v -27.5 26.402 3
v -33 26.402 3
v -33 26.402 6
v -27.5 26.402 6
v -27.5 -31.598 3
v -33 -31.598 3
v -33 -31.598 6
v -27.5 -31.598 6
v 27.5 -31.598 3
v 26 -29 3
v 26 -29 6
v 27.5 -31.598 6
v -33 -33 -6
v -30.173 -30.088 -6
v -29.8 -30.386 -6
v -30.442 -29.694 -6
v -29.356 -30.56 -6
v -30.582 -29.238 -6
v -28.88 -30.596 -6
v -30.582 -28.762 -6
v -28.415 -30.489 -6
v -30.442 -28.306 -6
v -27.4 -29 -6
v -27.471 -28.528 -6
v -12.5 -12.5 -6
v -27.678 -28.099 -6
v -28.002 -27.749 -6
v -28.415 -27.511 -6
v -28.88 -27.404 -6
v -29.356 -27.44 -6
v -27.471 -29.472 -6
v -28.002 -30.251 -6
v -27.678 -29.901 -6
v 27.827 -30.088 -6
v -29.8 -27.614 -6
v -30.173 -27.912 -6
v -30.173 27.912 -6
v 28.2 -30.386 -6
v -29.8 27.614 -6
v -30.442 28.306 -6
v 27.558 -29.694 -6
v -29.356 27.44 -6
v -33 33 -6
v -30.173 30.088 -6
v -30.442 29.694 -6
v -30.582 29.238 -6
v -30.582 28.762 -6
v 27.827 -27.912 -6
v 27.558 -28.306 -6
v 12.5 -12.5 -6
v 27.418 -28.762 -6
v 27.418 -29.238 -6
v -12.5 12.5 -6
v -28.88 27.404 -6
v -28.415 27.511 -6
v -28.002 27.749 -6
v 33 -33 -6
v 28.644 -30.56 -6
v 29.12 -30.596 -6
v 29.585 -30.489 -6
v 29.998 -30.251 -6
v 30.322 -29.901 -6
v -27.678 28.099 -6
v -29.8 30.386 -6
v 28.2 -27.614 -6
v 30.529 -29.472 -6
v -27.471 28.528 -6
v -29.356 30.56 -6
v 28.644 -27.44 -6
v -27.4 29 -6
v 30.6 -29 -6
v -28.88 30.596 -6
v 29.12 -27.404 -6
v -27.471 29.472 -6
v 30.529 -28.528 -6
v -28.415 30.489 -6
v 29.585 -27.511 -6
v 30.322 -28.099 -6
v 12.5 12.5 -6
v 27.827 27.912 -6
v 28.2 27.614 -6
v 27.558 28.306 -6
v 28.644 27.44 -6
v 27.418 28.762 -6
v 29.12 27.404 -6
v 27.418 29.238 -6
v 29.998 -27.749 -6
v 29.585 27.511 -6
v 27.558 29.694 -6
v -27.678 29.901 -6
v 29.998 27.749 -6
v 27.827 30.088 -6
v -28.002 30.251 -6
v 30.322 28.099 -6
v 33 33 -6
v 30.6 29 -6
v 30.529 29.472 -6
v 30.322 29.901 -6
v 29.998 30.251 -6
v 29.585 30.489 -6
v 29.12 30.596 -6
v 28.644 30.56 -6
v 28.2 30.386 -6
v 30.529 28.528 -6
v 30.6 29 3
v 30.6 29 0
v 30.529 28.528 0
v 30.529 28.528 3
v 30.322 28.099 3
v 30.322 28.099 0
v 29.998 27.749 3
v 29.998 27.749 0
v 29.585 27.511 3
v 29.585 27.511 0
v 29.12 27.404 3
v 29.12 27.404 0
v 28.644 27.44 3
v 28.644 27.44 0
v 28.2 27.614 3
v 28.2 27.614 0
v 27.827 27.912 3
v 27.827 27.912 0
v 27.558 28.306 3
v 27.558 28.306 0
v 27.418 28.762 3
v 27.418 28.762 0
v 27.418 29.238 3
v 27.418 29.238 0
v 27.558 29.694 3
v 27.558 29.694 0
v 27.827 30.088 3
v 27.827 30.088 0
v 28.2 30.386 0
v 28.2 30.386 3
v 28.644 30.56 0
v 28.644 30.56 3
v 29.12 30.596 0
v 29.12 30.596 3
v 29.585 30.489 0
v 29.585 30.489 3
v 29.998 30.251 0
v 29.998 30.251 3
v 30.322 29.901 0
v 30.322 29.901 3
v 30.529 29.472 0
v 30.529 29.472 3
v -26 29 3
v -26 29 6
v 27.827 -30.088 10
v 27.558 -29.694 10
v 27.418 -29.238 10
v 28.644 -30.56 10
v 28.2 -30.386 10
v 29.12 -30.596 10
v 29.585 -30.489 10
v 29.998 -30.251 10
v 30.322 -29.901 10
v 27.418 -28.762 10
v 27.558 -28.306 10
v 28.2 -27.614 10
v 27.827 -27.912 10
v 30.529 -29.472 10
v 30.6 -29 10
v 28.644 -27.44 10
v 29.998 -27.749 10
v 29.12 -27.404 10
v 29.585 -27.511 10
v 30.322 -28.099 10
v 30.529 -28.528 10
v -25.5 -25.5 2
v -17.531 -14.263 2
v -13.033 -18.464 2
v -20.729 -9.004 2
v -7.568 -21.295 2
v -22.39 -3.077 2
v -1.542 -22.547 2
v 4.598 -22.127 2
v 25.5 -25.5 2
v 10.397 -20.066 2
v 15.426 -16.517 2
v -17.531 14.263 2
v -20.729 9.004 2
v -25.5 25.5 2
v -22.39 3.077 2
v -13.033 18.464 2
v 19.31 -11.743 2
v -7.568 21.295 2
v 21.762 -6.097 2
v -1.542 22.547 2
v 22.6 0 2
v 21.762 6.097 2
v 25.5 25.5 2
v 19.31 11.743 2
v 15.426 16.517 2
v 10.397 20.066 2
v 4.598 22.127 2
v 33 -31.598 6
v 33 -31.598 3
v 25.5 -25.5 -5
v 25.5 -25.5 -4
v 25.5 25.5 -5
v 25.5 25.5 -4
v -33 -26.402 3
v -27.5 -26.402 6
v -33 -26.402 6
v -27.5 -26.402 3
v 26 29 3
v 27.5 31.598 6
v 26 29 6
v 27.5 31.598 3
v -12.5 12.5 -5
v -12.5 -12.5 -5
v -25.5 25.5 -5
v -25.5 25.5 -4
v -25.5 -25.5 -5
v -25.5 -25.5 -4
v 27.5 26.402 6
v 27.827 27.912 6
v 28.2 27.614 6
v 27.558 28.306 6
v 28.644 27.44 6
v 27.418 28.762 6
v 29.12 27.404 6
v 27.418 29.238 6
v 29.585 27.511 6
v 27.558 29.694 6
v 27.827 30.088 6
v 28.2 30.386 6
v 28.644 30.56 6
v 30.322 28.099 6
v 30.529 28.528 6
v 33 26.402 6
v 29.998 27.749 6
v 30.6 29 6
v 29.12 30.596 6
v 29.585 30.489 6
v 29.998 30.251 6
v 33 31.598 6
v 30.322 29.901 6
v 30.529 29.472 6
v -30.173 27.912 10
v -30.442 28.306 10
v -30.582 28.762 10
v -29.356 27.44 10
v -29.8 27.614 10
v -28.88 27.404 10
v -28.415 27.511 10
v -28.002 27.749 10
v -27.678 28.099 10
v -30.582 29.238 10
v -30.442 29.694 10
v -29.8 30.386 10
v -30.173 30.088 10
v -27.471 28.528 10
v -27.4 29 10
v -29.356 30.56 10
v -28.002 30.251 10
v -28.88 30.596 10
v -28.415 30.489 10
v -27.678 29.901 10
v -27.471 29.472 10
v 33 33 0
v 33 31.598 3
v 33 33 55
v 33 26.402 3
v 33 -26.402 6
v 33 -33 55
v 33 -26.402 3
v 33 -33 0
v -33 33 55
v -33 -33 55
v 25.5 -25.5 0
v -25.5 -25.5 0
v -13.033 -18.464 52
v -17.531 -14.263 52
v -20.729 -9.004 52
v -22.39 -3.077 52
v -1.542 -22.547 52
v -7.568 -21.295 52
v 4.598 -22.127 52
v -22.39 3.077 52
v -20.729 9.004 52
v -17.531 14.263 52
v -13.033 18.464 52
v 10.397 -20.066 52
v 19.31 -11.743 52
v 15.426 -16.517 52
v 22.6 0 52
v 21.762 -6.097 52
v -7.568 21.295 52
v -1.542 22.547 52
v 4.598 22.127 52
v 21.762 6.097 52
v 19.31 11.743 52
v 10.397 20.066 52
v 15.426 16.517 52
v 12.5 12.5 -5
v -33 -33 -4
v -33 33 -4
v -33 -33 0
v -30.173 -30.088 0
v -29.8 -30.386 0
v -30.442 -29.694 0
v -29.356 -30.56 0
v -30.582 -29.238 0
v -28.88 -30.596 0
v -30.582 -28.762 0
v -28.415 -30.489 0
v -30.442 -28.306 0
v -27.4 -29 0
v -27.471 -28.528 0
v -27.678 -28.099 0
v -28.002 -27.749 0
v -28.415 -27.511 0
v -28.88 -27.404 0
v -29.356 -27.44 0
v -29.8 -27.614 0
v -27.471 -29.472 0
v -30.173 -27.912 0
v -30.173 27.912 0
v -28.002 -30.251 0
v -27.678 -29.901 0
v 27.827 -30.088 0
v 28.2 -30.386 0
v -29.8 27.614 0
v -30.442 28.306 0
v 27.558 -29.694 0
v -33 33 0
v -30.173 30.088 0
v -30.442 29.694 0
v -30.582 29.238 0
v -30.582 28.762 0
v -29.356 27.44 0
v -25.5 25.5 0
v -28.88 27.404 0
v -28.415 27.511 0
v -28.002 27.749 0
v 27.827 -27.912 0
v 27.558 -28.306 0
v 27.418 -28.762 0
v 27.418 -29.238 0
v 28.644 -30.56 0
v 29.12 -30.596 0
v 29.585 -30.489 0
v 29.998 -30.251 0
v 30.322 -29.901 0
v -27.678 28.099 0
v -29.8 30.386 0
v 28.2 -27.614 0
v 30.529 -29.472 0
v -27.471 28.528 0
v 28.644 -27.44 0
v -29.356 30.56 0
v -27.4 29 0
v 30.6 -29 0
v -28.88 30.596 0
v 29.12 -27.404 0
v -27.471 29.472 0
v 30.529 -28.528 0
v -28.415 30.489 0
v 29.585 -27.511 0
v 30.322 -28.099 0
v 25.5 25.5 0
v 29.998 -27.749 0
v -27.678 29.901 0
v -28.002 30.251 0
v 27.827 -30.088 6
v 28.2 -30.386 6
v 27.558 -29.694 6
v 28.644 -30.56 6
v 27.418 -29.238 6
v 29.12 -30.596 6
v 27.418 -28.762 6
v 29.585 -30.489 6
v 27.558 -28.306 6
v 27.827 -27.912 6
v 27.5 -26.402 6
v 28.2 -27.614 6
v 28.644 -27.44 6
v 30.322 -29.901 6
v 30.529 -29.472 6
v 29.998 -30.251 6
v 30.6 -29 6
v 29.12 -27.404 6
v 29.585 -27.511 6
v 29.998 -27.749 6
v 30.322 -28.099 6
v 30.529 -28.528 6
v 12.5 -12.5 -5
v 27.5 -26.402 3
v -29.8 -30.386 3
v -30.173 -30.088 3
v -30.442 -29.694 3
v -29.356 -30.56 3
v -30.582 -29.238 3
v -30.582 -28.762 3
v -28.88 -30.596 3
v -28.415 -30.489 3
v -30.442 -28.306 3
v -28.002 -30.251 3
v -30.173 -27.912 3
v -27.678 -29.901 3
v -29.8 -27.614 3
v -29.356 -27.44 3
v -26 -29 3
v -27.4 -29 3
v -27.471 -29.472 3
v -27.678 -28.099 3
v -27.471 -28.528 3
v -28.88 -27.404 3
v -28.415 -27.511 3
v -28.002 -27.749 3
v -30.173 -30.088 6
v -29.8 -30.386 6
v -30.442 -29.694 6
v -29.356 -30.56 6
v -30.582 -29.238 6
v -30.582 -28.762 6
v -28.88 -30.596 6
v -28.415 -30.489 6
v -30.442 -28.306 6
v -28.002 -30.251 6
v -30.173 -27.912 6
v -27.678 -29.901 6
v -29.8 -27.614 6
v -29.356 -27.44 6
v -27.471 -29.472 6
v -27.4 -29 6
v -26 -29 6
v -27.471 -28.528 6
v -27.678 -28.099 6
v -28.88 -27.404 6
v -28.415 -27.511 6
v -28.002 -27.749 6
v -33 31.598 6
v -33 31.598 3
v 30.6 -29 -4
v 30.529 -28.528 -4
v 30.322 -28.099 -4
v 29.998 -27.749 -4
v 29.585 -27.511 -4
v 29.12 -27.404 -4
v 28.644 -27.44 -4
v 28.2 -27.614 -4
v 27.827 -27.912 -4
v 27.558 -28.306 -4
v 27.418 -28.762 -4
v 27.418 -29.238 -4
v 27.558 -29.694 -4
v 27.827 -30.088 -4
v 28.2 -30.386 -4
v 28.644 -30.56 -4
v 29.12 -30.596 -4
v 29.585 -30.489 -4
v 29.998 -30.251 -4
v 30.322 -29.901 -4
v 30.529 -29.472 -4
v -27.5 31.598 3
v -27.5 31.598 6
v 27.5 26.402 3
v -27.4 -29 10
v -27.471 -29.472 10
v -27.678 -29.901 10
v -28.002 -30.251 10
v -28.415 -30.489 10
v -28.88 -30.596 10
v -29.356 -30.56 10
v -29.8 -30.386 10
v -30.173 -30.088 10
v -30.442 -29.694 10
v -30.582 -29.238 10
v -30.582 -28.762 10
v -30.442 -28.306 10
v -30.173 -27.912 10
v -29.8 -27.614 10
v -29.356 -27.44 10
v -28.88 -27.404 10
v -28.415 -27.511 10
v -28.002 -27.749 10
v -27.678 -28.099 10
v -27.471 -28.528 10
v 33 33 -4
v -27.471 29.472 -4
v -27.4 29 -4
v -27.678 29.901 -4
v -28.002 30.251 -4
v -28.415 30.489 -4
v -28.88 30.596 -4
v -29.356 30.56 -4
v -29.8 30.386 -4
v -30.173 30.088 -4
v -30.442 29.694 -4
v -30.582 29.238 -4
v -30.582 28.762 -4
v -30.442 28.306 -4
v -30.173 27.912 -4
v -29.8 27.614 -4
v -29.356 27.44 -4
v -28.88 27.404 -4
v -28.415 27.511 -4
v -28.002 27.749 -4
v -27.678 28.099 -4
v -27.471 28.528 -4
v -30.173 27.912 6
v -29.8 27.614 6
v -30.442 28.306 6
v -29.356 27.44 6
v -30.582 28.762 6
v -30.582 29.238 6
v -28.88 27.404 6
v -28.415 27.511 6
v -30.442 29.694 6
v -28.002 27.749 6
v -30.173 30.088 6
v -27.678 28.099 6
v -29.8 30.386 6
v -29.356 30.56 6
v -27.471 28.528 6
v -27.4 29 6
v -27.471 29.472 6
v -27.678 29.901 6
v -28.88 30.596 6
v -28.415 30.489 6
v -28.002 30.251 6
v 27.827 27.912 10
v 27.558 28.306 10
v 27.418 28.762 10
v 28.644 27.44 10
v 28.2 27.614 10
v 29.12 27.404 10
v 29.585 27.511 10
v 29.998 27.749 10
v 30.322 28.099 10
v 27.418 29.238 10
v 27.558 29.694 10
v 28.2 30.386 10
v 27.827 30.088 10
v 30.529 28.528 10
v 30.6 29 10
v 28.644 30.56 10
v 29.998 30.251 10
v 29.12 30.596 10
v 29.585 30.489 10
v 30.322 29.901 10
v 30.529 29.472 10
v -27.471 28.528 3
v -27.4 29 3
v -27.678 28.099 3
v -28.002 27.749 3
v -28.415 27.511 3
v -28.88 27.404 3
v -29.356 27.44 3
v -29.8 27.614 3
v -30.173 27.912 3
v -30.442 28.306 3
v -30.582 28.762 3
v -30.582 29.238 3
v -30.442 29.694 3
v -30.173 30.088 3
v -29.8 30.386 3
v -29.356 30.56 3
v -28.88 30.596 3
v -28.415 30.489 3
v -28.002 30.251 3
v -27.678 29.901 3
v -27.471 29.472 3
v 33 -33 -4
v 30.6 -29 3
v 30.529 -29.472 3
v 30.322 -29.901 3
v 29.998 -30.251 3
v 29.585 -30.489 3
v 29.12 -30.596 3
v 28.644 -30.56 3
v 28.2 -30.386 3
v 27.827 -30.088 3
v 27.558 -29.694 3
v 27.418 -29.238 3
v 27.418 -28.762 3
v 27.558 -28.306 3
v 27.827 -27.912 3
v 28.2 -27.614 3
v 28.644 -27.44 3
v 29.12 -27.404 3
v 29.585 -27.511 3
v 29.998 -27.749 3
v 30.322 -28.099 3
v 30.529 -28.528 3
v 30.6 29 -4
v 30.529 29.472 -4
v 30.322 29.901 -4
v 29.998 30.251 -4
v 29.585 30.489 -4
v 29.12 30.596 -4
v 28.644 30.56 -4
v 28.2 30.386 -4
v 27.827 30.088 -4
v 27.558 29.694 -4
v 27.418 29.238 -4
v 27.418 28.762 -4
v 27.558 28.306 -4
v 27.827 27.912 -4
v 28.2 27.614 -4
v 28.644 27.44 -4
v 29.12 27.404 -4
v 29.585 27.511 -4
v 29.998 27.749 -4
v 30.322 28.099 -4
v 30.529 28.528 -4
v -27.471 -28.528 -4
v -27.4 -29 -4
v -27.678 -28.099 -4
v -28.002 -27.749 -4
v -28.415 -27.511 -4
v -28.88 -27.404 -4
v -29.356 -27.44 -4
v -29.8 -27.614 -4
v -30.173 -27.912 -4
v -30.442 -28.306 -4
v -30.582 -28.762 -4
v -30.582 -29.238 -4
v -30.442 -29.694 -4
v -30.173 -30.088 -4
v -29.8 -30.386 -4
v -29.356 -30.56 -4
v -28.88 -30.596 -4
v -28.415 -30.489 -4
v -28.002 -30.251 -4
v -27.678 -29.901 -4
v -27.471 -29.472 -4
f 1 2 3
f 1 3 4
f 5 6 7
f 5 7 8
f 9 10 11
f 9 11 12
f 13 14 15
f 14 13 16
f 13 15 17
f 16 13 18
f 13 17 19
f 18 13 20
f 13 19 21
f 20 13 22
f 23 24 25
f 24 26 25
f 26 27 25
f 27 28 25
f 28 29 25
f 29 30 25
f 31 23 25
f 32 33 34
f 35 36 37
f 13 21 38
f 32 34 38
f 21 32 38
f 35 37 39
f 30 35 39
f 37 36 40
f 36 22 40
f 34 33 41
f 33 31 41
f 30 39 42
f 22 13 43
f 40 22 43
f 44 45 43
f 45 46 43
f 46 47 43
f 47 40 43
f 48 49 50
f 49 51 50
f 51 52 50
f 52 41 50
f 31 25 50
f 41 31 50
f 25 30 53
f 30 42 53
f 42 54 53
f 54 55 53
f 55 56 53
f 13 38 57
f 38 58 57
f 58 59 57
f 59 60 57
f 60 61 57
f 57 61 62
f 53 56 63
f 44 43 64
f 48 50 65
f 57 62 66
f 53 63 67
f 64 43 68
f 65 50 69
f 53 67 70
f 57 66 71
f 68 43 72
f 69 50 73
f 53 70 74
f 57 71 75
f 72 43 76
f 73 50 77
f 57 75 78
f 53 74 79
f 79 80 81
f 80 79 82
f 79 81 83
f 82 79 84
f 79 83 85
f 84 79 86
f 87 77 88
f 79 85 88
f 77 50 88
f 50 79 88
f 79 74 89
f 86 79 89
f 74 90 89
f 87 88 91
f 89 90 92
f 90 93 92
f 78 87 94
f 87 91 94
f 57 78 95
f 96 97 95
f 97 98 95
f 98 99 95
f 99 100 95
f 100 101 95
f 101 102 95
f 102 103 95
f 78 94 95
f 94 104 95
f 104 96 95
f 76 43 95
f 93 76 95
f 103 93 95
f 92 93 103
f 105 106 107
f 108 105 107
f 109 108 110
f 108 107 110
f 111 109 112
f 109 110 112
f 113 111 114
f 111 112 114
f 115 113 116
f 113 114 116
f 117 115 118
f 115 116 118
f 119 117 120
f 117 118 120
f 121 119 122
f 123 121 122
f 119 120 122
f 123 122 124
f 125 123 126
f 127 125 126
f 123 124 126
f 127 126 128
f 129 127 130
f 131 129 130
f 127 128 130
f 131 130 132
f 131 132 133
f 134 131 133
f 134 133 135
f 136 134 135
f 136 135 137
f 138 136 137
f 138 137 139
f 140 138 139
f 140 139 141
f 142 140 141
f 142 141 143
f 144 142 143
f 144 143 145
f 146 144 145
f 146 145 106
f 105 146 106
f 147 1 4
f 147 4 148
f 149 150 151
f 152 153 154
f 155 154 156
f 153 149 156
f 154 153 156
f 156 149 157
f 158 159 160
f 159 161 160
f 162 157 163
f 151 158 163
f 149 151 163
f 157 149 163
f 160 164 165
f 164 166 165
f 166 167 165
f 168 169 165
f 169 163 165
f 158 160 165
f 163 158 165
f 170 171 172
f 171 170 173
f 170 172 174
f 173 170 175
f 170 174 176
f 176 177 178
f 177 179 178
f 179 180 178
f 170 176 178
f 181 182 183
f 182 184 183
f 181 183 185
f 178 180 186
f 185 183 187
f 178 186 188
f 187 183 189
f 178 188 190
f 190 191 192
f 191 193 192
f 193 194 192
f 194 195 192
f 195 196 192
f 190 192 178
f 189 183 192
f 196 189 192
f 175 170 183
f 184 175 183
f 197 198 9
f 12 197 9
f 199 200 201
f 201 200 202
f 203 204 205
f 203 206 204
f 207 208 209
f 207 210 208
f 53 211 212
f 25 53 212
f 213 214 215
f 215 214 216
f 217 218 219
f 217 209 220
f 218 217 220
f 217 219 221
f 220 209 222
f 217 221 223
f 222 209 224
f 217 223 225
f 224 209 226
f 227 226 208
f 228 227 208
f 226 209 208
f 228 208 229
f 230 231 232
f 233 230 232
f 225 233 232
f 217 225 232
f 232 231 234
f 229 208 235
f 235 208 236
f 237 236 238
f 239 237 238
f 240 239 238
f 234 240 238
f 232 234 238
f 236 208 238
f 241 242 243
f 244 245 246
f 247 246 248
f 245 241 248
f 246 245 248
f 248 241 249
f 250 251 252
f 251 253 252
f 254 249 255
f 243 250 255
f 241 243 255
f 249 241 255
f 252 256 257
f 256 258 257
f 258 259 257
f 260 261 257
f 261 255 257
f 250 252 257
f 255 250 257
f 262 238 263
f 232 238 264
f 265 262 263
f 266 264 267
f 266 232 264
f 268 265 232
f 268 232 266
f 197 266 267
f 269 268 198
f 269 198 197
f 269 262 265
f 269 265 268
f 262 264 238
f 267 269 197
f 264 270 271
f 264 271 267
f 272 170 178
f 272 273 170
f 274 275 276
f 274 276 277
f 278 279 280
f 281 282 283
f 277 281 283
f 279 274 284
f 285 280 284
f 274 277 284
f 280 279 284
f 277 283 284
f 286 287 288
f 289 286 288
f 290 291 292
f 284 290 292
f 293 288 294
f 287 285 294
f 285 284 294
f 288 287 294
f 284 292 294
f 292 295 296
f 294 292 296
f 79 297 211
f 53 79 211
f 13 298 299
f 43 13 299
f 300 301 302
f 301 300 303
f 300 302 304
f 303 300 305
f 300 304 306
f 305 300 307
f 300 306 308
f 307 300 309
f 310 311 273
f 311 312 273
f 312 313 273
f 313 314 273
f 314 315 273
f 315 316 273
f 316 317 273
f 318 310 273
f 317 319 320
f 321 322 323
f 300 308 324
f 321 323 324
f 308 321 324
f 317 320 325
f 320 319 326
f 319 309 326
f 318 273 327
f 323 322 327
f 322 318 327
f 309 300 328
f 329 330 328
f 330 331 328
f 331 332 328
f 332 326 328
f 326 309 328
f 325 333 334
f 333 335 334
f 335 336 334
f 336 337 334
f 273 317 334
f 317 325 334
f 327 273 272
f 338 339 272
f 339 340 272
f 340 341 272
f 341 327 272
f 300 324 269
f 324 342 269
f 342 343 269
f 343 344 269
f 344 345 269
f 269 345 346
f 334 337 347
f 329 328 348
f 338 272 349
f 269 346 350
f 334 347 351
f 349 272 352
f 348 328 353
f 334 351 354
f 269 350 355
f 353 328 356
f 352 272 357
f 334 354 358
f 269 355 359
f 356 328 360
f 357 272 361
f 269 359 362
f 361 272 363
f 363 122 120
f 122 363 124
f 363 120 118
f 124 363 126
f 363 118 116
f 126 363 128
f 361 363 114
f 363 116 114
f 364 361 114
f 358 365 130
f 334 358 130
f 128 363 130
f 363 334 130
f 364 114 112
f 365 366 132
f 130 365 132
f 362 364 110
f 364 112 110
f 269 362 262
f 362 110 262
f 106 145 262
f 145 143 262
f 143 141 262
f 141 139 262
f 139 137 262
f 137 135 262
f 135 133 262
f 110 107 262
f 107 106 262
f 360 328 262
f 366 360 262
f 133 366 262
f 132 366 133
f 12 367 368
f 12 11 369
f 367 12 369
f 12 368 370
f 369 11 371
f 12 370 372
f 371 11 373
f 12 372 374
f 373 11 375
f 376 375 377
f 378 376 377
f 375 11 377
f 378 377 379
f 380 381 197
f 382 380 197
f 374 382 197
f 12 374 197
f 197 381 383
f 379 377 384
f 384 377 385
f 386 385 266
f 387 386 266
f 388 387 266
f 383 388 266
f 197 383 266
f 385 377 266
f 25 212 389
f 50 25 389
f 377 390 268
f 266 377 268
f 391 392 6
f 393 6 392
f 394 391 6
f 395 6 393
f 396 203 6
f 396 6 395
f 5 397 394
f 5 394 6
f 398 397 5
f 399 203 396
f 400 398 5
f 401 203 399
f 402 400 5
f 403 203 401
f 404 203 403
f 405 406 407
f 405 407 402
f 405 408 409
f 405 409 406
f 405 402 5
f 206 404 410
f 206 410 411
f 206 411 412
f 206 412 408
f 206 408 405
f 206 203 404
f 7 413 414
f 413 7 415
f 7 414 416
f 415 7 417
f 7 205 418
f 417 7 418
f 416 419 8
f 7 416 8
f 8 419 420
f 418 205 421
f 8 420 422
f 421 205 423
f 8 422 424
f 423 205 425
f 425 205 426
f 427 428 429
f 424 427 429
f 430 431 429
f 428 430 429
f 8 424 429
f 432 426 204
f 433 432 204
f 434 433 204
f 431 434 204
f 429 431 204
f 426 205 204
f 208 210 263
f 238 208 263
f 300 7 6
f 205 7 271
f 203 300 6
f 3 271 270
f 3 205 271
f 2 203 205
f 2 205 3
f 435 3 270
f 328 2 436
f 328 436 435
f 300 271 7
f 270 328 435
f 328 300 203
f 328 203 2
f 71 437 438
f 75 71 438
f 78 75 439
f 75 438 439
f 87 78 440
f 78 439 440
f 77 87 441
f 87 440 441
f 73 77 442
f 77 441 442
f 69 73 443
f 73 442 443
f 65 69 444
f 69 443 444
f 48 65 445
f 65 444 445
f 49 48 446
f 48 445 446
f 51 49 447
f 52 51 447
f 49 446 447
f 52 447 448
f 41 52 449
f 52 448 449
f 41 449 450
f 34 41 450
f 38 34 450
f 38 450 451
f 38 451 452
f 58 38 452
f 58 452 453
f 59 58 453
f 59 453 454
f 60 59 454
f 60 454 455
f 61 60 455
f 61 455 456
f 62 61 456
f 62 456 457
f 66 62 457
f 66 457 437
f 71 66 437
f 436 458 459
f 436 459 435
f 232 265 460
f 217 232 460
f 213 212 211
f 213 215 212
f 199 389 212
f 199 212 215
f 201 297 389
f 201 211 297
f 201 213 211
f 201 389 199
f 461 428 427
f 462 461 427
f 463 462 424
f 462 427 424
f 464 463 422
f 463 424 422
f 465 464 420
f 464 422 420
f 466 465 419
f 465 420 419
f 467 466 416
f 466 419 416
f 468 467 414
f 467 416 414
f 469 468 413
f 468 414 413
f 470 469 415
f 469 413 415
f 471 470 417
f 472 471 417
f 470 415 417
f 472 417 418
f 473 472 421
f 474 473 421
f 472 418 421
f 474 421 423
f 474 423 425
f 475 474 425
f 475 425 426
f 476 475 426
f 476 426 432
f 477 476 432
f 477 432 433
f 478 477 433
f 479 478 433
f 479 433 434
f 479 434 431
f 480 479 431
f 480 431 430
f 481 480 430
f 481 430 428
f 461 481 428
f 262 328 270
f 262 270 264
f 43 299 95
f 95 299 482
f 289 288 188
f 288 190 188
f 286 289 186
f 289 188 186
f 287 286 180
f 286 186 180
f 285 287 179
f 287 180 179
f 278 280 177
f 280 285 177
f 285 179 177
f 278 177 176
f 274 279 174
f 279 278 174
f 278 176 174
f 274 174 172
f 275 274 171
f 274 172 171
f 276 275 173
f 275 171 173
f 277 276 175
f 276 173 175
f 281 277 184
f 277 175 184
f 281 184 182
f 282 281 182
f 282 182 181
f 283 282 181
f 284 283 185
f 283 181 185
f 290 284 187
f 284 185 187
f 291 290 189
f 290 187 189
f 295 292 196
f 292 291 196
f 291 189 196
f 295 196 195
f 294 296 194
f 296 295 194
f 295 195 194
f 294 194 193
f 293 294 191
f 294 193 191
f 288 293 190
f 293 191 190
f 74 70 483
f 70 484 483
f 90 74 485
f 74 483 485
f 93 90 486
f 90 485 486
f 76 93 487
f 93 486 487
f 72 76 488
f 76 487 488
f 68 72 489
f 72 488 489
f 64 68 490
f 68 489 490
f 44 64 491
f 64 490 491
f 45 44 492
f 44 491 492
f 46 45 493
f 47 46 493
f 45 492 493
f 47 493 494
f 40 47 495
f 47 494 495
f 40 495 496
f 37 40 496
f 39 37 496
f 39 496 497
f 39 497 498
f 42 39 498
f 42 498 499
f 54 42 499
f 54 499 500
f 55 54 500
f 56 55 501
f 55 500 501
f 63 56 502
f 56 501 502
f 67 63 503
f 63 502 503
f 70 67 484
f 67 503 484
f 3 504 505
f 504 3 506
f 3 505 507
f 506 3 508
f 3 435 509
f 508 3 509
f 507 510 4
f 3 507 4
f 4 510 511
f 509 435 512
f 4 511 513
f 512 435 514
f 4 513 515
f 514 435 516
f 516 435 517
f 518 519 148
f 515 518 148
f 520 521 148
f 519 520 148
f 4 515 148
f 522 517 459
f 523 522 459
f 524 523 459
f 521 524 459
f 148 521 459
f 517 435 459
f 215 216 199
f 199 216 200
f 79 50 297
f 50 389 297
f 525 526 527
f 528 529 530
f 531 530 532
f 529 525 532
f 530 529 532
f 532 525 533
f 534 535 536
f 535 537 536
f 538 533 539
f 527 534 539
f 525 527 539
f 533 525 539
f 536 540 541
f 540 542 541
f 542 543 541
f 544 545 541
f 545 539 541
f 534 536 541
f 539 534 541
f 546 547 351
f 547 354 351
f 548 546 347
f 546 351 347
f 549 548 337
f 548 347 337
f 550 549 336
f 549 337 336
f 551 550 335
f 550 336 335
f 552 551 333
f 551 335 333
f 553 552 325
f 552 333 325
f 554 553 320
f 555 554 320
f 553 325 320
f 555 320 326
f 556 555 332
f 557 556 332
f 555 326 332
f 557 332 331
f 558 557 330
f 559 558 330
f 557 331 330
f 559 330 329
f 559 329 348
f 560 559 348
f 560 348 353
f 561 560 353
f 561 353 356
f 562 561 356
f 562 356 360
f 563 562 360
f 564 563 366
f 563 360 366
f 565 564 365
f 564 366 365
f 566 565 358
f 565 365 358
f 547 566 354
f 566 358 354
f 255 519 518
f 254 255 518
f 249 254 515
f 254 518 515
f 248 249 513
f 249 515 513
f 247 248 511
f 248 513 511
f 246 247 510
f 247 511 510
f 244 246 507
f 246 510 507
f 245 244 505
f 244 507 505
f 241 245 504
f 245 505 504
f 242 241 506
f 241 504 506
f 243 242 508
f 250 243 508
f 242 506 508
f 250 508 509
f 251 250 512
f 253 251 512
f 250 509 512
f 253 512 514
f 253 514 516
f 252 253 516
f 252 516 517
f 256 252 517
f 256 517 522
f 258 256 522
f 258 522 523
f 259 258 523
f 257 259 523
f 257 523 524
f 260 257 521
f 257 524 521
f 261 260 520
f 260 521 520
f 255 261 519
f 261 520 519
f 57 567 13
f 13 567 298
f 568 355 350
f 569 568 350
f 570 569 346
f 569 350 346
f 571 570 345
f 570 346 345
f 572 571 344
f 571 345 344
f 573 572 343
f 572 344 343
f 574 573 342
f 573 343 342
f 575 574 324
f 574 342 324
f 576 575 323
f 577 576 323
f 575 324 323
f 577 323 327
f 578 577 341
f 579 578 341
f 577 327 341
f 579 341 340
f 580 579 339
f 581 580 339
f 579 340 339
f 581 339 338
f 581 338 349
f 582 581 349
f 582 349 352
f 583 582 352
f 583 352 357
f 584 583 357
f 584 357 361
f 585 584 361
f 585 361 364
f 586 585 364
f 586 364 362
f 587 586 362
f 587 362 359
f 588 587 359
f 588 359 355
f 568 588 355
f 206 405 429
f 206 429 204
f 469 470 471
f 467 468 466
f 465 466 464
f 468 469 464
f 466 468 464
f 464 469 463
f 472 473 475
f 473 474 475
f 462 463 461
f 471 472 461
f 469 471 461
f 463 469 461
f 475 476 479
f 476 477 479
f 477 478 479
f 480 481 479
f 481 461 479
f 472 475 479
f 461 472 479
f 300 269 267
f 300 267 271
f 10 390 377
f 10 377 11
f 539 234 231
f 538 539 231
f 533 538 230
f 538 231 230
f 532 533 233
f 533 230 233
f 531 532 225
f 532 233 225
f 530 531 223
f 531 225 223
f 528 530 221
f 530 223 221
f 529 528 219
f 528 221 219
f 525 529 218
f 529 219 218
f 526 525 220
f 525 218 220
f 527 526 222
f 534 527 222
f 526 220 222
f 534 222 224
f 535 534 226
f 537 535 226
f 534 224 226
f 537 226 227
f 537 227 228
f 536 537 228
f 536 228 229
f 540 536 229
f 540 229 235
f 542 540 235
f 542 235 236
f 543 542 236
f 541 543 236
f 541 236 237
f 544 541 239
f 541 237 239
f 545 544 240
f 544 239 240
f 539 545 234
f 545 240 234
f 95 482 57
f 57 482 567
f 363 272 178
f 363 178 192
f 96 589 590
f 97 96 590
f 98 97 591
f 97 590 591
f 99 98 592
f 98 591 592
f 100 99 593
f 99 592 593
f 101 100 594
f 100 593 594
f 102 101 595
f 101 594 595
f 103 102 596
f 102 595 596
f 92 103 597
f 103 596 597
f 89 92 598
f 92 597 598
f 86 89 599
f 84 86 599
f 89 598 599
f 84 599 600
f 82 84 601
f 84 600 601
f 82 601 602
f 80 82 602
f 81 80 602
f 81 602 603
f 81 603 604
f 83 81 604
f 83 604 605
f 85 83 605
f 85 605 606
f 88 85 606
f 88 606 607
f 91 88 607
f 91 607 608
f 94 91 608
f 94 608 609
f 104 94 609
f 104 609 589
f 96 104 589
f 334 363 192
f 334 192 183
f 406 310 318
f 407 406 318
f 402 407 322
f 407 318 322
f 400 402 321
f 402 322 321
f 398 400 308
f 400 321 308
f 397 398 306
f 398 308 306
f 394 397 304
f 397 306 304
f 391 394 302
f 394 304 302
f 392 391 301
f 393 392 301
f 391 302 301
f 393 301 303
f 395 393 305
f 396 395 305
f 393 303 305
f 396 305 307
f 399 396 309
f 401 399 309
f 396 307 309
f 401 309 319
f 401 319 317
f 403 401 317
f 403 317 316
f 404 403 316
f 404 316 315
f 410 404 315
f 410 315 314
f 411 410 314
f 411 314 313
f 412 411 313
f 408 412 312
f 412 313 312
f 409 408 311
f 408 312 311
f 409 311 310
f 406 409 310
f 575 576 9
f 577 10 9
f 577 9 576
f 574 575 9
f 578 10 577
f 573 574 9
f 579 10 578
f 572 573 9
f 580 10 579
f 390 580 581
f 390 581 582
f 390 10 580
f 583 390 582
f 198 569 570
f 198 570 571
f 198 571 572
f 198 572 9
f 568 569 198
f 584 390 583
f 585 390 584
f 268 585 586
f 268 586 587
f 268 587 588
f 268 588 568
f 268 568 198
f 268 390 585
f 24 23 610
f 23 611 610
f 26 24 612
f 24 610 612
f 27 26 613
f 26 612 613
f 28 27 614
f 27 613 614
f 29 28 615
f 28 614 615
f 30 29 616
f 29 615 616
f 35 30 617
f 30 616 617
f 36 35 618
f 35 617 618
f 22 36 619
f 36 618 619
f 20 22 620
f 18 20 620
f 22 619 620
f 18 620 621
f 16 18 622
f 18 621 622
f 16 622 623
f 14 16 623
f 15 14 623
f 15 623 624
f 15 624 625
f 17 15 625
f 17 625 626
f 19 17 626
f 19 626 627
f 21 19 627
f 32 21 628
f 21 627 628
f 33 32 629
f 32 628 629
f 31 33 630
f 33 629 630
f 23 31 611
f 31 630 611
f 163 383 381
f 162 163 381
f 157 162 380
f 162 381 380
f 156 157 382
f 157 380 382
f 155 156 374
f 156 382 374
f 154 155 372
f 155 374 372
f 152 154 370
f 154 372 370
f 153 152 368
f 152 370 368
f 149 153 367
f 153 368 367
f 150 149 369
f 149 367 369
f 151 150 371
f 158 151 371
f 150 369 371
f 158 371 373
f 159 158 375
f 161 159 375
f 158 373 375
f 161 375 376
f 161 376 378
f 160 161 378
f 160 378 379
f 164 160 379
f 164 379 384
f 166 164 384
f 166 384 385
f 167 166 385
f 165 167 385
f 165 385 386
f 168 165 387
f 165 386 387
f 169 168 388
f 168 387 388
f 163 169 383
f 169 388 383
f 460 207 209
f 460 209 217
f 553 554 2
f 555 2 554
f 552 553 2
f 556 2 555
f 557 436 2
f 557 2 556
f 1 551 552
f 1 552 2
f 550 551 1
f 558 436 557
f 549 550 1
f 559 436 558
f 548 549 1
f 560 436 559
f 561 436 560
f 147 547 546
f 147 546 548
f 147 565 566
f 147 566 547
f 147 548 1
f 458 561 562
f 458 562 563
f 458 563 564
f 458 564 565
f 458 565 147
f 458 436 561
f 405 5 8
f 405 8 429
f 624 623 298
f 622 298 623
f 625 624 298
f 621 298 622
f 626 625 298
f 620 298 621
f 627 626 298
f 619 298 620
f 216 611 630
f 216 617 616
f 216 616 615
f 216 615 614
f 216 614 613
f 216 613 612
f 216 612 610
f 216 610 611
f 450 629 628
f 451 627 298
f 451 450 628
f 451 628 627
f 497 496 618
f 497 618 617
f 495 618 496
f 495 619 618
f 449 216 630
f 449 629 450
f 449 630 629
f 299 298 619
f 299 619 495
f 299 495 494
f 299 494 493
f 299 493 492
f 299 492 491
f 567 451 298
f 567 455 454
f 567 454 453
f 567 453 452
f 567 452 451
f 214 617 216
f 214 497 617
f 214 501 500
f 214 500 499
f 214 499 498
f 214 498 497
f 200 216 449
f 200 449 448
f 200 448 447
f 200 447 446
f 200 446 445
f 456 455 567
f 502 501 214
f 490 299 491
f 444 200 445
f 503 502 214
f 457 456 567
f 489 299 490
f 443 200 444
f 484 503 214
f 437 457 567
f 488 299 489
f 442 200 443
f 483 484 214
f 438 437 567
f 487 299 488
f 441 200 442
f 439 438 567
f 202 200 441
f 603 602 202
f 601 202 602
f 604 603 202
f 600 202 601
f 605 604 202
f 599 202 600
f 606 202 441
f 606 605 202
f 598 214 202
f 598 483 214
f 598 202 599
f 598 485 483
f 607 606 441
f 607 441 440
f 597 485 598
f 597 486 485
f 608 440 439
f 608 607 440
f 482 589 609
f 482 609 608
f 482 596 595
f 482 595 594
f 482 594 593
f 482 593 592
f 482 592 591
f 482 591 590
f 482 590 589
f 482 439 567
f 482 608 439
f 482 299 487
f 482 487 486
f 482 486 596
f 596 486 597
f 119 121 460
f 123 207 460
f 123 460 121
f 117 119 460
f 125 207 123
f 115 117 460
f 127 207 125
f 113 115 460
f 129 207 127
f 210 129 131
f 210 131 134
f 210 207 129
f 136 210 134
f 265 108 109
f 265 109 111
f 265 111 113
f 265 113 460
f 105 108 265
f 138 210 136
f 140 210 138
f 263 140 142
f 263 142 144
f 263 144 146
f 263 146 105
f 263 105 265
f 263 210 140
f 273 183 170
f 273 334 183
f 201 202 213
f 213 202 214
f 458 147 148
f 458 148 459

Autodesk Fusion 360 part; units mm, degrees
sketch "Sketch1" plane through (0, 0, 0) normal (0, 0, 1) x (1, 0, 0)
  line L0 (25.5, 25.5) -> (-25.5, 25.5)
  line L1 (-25.5, 25.5) -> (-25.5, -25.5)
  line L2 (-25.5, -25.5) -> (25.5, -25.5)
  line L3 (25.5, -25.5) -> (25.5, 25.5)
  line L4 (25.5, 25.5) -> (-25.5, -25.5) construction
  line L5 (-25.5, 25.5) -> (25.5, -25.5) construction
  circle A0 centre (0, 0) radius 22.6
  line L6 (-33, 33) -> (33, 33)
  line L7 (33, 33) -> (33, -33)
  line L8 (33, -33) -> (-33, -33)
  line L9 (-33, -33) -> (-33, 33)
  line L10 (-33, 33) -> (33, -33) construction
  line L11 (33, 33) -> (-33, -33) construction
  circle A1 centre (-29, 29) radius 1.6
  circle A2 centre (29, 29) radius 1.6
  circle A3 centre (-29, -29) radius 1.6
  circle A4 centre (29, -29) radius 1.6
  line L12 (-12.5, -12.5) -> (12.5, -12.5)
  line L13 (12.5, -12.5) -> (12.5, 12.5)
  line L14 (12.5, 12.5) -> (-12.5, 12.5)
  line L15 (-12.5, 12.5) -> (-12.5, -12.5)
  line L16 (-12.5, -12.5) -> (12.5, 12.5) construction
  line L17 (12.5, -12.5) -> (-12.5, 12.5) construction
  line L18 (-26, 29) -> (-27.5, 31.5981)
  line L19 (-27.5, 31.5981) -> (-30.5, 31.5981)
  line L20 (-30.5, 31.5981) -> (-32, 29)
  line L21 (-32, 29) -> (-30.5, 26.4019)
  line L22 (-30.5, 26.4019) -> (-27.5, 26.4019)
  line L23 (-27.5, 26.4019) -> (-26, 29)
  line L24 (30.5, 31.5981) -> (27.5, 31.5981)
  line L25 (32, 29) -> (30.5, 31.5981)
  line L26 (30.5, 26.4019) -> (32, 29)
  line L27 (27.5, 26.4019) -> (30.5, 26.4019)
  line L28 (26, 29) -> (27.5, 26.4019)
  line L29 (27.5, 31.5981) -> (26, 29)
  line L30 (-27.5, -26.4019) -> (-30.5, -26.4019)
  line L31 (-26, -29) -> (-27.5, -26.4019)
  line L32 (-27.5, -31.5981) -> (-26, -29)
  line L33 (-30.5, -31.5981) -> (-27.5, -31.5981)
  line L34 (-32, -29) -> (-30.5, -31.5981)
  line L35 (-30.5, -26.4019) -> (-32, -29)
  line L36 (30.5, -26.4019) -> (27.5, -26.4019)
  line L37 (32, -29) -> (30.5, -26.4019)
  line L38 (30.5, -31.5981) -> (32, -29)
  line L39 (27.5, -31.5981) -> (30.5, -31.5981)
  line L40 (26, -29) -> (27.5, -31.5981)
  line L41 (27.5, -26.4019) -> (26, -29)
  line L42 (-27.5, 31.5981) -> (-36.4083, 31.5981)
  line L43 (-36.4083, 31.5981) -> (-36.4083, 26.4019)
  line L44 (-36.4083, 26.4019) -> (-27.5, 26.4019)
  line L45 (-27.5, 26.4019) -> (-27.5, 31.5981)
  line L46 (-27.5, -26.4019) -> (-35.7888, -26.4019)
  line L47 (-35.7888, -26.4019) -> (-35.7888, -31.5981)
  line L48 (-35.7888, -31.5981) -> (-27.5, -31.5981)
  line L49 (-27.5, -31.5981) -> (-27.5, -26.4019)
  line L50 (27.5, 31.5981) -> (36.8588, 31.5981)
  line L51 (36.8588, 31.5981) -> (36.8588, 26.4019)
  line L52 (36.8588, 26.4019) -> (27.5, 26.4019)
  line L53 (27.5, 26.4019) -> (27.5, 31.5981)
  line L54 (27.5, -26.4019) -> (36.5392, -26.4019)
  line L55 (36.5392, -26.4019) -> (36.5392, -31.5981)
  line L56 (36.5392, -31.5981) -> (27.5, -31.5981)
  line L57 (27.5, -31.5981) -> (27.5, -26.4019)
  point P0 (29, 29)
  point P1 (-29, -29)
  point P2 (29, -29)
  point P3 (-29, 29)
  dimension "d1" = 51
  dimension "d2" = 51
  dimension "d3" = 45.2
  dimension "d4" = 66
  dimension "d5" = 66
  dimension "d6" = 3.2
  dimension "d9" = 58
  dimension "d10" = -58
  dimension "d13" = 58
  dimension "d14" = -58
  dimension "d23" = 25
  dimension "d24" = 25
  dimension "d28" = 3
  dimension "d31" = 58
  dimension "d32" = -58
extrude "Extrude1" add sketch "Sketch1" along normal blind 55 contours L0 L1 L2 L3 | A0 | L6 L7 L8 L9 L18 L19 L22 L23 L24 L27 L28 L29 L30 L31 L32 L33 L36 L39 L40 L41 L42 L44 L46 L48 L50 L52 L54 L56 | L9 L20 L21 L42 L44 | L7 L25 L26 L50 L52 | A1 L19 L20 L21 L22 L42 L44 L45 | A2 L24 L25 L26 L27 L50 L52 L53 | L9 L34 L35 L46 L48 | A1 L18 L23 L45 | L7 L37 L38 L54 L56 | A2 L28 L29 L53 | A3 L30 L33 L34 L35 L46 L48 L49 | A1 L45 | A1 L45 | A4 L36 L37 L38 L39 L54 L56 L57 | A2 L53 | A2 L53 | A3 L31 L32 L49 | A4 L40 L41 L57 | A3 L49 | A3 L49 | A4 L57 | A4 L57 | L12 L13 L14 L15 makes body 1
extrude "Extrude2" cut sketch "Sketch1" along normal blind 52 contours A0 | L12 L13 L14 L15 bodies 1
extrude "Extrude3" cut sketch "Sketch1" along normal blind 2 contours L0 L1 L2 L3 bodies 1
extrude "Extrude4" cut sketch "Sketch1" along normal blind 10 contours A1 L45 | A1 L45 | A2 L53 | A2 L53 | A3 L49 | A3 L49 | A4 L57 | A4 L57 bodies 1
extrude "Extrude5" add sketch "Sketch1" against normal blind 1 from surface at -5 separate body contours L0 L1 L2 L3 | A0 | L6 L7 L8 L9 L18 L19 L22 L23 L24 L27 L28 L29 L30 L31 L32 L33 L36 L39 L40 L41 L42 L44 L46 L48 L50 L52 L54 L56 | L9 L20 L21 L42 L44 | L7 L25 L26 L50 L52 | A1 L19 L20 L21 L22 L42 L44 L45 | A2 L24 L25 L26 L27 L50 L52 L53 | L9 L34 L35 L46 L48 | A1 L18 L23 L45 | L7 L37 L38 L54 L56 | A2 L28 L29 L53 | A3 L30 L33 L34 L35 L46 L48 L49 | A4 L36 L37 L38 L39 L54 L56 L57 | A3 L31 L32 L49 | A4 L40 L41 L57 makes body 2
extrude "Extrude6" cut sketch "Sketch1" along normal blind 3 from surface at 3 contours L9 L20 L21 L42 L44 | L9 L42 L43 L44 | L7 L50 L51 L52 | L7 L25 L26 L50 L52 | A1 L19 L20 L21 L22 L42 L44 L45 | A2 L24 L25 L26 L27 L50 L52 L53 | L9 L34 L35 L46 L48 | L9 L46 L47 L48 | A1 L18 L23 L45 | L7 L37 L38 L54 L56 | A2 L28 L29 L53 | A3 L30 L33 L34 L35 L46 L48 L49 | A1 L45 | A1 L45 | A4 L36 L37 L38 L39 L54 L56 L57 | A2 L53 | A2 L53 | A3 L31 L32 L49 | A4 L40 L41 L57 | A3 L49 | A3 L49 | A4 L57 | A4 L57 bodies 1
extrude "Extrude7" add sketch "Sketch1" against normal blind 1 from surface at -4 contours L6 L7 L8 L9 L18 L19 L22 L23 L24 L27 L28 L29 L30 L31 L32 L33 L36 L39 L40 L41 L42 L44 L46 L48 L50 L52 L54 L56 | L9 L20 L21 L42 L44 | L7 L25 L26 L50 L52 | A1 L19 L20 L21 L22 L42 L44 L45 | A2 L24 L25 L26 L27 L50 L52 L53 | L9 L34 L35 L46 L48 | A1 L18 L23 L45 | L7 L37 L38 L54 L56 | A2 L28 L29 L53 | A3 L30 L33 L34 L35 L46 L48 L49 | A4 L36 L37 L38 L39 L54 L56 L57 | A3 L31 L32 L49 | A4 L40 L41 L57 bodies 2
